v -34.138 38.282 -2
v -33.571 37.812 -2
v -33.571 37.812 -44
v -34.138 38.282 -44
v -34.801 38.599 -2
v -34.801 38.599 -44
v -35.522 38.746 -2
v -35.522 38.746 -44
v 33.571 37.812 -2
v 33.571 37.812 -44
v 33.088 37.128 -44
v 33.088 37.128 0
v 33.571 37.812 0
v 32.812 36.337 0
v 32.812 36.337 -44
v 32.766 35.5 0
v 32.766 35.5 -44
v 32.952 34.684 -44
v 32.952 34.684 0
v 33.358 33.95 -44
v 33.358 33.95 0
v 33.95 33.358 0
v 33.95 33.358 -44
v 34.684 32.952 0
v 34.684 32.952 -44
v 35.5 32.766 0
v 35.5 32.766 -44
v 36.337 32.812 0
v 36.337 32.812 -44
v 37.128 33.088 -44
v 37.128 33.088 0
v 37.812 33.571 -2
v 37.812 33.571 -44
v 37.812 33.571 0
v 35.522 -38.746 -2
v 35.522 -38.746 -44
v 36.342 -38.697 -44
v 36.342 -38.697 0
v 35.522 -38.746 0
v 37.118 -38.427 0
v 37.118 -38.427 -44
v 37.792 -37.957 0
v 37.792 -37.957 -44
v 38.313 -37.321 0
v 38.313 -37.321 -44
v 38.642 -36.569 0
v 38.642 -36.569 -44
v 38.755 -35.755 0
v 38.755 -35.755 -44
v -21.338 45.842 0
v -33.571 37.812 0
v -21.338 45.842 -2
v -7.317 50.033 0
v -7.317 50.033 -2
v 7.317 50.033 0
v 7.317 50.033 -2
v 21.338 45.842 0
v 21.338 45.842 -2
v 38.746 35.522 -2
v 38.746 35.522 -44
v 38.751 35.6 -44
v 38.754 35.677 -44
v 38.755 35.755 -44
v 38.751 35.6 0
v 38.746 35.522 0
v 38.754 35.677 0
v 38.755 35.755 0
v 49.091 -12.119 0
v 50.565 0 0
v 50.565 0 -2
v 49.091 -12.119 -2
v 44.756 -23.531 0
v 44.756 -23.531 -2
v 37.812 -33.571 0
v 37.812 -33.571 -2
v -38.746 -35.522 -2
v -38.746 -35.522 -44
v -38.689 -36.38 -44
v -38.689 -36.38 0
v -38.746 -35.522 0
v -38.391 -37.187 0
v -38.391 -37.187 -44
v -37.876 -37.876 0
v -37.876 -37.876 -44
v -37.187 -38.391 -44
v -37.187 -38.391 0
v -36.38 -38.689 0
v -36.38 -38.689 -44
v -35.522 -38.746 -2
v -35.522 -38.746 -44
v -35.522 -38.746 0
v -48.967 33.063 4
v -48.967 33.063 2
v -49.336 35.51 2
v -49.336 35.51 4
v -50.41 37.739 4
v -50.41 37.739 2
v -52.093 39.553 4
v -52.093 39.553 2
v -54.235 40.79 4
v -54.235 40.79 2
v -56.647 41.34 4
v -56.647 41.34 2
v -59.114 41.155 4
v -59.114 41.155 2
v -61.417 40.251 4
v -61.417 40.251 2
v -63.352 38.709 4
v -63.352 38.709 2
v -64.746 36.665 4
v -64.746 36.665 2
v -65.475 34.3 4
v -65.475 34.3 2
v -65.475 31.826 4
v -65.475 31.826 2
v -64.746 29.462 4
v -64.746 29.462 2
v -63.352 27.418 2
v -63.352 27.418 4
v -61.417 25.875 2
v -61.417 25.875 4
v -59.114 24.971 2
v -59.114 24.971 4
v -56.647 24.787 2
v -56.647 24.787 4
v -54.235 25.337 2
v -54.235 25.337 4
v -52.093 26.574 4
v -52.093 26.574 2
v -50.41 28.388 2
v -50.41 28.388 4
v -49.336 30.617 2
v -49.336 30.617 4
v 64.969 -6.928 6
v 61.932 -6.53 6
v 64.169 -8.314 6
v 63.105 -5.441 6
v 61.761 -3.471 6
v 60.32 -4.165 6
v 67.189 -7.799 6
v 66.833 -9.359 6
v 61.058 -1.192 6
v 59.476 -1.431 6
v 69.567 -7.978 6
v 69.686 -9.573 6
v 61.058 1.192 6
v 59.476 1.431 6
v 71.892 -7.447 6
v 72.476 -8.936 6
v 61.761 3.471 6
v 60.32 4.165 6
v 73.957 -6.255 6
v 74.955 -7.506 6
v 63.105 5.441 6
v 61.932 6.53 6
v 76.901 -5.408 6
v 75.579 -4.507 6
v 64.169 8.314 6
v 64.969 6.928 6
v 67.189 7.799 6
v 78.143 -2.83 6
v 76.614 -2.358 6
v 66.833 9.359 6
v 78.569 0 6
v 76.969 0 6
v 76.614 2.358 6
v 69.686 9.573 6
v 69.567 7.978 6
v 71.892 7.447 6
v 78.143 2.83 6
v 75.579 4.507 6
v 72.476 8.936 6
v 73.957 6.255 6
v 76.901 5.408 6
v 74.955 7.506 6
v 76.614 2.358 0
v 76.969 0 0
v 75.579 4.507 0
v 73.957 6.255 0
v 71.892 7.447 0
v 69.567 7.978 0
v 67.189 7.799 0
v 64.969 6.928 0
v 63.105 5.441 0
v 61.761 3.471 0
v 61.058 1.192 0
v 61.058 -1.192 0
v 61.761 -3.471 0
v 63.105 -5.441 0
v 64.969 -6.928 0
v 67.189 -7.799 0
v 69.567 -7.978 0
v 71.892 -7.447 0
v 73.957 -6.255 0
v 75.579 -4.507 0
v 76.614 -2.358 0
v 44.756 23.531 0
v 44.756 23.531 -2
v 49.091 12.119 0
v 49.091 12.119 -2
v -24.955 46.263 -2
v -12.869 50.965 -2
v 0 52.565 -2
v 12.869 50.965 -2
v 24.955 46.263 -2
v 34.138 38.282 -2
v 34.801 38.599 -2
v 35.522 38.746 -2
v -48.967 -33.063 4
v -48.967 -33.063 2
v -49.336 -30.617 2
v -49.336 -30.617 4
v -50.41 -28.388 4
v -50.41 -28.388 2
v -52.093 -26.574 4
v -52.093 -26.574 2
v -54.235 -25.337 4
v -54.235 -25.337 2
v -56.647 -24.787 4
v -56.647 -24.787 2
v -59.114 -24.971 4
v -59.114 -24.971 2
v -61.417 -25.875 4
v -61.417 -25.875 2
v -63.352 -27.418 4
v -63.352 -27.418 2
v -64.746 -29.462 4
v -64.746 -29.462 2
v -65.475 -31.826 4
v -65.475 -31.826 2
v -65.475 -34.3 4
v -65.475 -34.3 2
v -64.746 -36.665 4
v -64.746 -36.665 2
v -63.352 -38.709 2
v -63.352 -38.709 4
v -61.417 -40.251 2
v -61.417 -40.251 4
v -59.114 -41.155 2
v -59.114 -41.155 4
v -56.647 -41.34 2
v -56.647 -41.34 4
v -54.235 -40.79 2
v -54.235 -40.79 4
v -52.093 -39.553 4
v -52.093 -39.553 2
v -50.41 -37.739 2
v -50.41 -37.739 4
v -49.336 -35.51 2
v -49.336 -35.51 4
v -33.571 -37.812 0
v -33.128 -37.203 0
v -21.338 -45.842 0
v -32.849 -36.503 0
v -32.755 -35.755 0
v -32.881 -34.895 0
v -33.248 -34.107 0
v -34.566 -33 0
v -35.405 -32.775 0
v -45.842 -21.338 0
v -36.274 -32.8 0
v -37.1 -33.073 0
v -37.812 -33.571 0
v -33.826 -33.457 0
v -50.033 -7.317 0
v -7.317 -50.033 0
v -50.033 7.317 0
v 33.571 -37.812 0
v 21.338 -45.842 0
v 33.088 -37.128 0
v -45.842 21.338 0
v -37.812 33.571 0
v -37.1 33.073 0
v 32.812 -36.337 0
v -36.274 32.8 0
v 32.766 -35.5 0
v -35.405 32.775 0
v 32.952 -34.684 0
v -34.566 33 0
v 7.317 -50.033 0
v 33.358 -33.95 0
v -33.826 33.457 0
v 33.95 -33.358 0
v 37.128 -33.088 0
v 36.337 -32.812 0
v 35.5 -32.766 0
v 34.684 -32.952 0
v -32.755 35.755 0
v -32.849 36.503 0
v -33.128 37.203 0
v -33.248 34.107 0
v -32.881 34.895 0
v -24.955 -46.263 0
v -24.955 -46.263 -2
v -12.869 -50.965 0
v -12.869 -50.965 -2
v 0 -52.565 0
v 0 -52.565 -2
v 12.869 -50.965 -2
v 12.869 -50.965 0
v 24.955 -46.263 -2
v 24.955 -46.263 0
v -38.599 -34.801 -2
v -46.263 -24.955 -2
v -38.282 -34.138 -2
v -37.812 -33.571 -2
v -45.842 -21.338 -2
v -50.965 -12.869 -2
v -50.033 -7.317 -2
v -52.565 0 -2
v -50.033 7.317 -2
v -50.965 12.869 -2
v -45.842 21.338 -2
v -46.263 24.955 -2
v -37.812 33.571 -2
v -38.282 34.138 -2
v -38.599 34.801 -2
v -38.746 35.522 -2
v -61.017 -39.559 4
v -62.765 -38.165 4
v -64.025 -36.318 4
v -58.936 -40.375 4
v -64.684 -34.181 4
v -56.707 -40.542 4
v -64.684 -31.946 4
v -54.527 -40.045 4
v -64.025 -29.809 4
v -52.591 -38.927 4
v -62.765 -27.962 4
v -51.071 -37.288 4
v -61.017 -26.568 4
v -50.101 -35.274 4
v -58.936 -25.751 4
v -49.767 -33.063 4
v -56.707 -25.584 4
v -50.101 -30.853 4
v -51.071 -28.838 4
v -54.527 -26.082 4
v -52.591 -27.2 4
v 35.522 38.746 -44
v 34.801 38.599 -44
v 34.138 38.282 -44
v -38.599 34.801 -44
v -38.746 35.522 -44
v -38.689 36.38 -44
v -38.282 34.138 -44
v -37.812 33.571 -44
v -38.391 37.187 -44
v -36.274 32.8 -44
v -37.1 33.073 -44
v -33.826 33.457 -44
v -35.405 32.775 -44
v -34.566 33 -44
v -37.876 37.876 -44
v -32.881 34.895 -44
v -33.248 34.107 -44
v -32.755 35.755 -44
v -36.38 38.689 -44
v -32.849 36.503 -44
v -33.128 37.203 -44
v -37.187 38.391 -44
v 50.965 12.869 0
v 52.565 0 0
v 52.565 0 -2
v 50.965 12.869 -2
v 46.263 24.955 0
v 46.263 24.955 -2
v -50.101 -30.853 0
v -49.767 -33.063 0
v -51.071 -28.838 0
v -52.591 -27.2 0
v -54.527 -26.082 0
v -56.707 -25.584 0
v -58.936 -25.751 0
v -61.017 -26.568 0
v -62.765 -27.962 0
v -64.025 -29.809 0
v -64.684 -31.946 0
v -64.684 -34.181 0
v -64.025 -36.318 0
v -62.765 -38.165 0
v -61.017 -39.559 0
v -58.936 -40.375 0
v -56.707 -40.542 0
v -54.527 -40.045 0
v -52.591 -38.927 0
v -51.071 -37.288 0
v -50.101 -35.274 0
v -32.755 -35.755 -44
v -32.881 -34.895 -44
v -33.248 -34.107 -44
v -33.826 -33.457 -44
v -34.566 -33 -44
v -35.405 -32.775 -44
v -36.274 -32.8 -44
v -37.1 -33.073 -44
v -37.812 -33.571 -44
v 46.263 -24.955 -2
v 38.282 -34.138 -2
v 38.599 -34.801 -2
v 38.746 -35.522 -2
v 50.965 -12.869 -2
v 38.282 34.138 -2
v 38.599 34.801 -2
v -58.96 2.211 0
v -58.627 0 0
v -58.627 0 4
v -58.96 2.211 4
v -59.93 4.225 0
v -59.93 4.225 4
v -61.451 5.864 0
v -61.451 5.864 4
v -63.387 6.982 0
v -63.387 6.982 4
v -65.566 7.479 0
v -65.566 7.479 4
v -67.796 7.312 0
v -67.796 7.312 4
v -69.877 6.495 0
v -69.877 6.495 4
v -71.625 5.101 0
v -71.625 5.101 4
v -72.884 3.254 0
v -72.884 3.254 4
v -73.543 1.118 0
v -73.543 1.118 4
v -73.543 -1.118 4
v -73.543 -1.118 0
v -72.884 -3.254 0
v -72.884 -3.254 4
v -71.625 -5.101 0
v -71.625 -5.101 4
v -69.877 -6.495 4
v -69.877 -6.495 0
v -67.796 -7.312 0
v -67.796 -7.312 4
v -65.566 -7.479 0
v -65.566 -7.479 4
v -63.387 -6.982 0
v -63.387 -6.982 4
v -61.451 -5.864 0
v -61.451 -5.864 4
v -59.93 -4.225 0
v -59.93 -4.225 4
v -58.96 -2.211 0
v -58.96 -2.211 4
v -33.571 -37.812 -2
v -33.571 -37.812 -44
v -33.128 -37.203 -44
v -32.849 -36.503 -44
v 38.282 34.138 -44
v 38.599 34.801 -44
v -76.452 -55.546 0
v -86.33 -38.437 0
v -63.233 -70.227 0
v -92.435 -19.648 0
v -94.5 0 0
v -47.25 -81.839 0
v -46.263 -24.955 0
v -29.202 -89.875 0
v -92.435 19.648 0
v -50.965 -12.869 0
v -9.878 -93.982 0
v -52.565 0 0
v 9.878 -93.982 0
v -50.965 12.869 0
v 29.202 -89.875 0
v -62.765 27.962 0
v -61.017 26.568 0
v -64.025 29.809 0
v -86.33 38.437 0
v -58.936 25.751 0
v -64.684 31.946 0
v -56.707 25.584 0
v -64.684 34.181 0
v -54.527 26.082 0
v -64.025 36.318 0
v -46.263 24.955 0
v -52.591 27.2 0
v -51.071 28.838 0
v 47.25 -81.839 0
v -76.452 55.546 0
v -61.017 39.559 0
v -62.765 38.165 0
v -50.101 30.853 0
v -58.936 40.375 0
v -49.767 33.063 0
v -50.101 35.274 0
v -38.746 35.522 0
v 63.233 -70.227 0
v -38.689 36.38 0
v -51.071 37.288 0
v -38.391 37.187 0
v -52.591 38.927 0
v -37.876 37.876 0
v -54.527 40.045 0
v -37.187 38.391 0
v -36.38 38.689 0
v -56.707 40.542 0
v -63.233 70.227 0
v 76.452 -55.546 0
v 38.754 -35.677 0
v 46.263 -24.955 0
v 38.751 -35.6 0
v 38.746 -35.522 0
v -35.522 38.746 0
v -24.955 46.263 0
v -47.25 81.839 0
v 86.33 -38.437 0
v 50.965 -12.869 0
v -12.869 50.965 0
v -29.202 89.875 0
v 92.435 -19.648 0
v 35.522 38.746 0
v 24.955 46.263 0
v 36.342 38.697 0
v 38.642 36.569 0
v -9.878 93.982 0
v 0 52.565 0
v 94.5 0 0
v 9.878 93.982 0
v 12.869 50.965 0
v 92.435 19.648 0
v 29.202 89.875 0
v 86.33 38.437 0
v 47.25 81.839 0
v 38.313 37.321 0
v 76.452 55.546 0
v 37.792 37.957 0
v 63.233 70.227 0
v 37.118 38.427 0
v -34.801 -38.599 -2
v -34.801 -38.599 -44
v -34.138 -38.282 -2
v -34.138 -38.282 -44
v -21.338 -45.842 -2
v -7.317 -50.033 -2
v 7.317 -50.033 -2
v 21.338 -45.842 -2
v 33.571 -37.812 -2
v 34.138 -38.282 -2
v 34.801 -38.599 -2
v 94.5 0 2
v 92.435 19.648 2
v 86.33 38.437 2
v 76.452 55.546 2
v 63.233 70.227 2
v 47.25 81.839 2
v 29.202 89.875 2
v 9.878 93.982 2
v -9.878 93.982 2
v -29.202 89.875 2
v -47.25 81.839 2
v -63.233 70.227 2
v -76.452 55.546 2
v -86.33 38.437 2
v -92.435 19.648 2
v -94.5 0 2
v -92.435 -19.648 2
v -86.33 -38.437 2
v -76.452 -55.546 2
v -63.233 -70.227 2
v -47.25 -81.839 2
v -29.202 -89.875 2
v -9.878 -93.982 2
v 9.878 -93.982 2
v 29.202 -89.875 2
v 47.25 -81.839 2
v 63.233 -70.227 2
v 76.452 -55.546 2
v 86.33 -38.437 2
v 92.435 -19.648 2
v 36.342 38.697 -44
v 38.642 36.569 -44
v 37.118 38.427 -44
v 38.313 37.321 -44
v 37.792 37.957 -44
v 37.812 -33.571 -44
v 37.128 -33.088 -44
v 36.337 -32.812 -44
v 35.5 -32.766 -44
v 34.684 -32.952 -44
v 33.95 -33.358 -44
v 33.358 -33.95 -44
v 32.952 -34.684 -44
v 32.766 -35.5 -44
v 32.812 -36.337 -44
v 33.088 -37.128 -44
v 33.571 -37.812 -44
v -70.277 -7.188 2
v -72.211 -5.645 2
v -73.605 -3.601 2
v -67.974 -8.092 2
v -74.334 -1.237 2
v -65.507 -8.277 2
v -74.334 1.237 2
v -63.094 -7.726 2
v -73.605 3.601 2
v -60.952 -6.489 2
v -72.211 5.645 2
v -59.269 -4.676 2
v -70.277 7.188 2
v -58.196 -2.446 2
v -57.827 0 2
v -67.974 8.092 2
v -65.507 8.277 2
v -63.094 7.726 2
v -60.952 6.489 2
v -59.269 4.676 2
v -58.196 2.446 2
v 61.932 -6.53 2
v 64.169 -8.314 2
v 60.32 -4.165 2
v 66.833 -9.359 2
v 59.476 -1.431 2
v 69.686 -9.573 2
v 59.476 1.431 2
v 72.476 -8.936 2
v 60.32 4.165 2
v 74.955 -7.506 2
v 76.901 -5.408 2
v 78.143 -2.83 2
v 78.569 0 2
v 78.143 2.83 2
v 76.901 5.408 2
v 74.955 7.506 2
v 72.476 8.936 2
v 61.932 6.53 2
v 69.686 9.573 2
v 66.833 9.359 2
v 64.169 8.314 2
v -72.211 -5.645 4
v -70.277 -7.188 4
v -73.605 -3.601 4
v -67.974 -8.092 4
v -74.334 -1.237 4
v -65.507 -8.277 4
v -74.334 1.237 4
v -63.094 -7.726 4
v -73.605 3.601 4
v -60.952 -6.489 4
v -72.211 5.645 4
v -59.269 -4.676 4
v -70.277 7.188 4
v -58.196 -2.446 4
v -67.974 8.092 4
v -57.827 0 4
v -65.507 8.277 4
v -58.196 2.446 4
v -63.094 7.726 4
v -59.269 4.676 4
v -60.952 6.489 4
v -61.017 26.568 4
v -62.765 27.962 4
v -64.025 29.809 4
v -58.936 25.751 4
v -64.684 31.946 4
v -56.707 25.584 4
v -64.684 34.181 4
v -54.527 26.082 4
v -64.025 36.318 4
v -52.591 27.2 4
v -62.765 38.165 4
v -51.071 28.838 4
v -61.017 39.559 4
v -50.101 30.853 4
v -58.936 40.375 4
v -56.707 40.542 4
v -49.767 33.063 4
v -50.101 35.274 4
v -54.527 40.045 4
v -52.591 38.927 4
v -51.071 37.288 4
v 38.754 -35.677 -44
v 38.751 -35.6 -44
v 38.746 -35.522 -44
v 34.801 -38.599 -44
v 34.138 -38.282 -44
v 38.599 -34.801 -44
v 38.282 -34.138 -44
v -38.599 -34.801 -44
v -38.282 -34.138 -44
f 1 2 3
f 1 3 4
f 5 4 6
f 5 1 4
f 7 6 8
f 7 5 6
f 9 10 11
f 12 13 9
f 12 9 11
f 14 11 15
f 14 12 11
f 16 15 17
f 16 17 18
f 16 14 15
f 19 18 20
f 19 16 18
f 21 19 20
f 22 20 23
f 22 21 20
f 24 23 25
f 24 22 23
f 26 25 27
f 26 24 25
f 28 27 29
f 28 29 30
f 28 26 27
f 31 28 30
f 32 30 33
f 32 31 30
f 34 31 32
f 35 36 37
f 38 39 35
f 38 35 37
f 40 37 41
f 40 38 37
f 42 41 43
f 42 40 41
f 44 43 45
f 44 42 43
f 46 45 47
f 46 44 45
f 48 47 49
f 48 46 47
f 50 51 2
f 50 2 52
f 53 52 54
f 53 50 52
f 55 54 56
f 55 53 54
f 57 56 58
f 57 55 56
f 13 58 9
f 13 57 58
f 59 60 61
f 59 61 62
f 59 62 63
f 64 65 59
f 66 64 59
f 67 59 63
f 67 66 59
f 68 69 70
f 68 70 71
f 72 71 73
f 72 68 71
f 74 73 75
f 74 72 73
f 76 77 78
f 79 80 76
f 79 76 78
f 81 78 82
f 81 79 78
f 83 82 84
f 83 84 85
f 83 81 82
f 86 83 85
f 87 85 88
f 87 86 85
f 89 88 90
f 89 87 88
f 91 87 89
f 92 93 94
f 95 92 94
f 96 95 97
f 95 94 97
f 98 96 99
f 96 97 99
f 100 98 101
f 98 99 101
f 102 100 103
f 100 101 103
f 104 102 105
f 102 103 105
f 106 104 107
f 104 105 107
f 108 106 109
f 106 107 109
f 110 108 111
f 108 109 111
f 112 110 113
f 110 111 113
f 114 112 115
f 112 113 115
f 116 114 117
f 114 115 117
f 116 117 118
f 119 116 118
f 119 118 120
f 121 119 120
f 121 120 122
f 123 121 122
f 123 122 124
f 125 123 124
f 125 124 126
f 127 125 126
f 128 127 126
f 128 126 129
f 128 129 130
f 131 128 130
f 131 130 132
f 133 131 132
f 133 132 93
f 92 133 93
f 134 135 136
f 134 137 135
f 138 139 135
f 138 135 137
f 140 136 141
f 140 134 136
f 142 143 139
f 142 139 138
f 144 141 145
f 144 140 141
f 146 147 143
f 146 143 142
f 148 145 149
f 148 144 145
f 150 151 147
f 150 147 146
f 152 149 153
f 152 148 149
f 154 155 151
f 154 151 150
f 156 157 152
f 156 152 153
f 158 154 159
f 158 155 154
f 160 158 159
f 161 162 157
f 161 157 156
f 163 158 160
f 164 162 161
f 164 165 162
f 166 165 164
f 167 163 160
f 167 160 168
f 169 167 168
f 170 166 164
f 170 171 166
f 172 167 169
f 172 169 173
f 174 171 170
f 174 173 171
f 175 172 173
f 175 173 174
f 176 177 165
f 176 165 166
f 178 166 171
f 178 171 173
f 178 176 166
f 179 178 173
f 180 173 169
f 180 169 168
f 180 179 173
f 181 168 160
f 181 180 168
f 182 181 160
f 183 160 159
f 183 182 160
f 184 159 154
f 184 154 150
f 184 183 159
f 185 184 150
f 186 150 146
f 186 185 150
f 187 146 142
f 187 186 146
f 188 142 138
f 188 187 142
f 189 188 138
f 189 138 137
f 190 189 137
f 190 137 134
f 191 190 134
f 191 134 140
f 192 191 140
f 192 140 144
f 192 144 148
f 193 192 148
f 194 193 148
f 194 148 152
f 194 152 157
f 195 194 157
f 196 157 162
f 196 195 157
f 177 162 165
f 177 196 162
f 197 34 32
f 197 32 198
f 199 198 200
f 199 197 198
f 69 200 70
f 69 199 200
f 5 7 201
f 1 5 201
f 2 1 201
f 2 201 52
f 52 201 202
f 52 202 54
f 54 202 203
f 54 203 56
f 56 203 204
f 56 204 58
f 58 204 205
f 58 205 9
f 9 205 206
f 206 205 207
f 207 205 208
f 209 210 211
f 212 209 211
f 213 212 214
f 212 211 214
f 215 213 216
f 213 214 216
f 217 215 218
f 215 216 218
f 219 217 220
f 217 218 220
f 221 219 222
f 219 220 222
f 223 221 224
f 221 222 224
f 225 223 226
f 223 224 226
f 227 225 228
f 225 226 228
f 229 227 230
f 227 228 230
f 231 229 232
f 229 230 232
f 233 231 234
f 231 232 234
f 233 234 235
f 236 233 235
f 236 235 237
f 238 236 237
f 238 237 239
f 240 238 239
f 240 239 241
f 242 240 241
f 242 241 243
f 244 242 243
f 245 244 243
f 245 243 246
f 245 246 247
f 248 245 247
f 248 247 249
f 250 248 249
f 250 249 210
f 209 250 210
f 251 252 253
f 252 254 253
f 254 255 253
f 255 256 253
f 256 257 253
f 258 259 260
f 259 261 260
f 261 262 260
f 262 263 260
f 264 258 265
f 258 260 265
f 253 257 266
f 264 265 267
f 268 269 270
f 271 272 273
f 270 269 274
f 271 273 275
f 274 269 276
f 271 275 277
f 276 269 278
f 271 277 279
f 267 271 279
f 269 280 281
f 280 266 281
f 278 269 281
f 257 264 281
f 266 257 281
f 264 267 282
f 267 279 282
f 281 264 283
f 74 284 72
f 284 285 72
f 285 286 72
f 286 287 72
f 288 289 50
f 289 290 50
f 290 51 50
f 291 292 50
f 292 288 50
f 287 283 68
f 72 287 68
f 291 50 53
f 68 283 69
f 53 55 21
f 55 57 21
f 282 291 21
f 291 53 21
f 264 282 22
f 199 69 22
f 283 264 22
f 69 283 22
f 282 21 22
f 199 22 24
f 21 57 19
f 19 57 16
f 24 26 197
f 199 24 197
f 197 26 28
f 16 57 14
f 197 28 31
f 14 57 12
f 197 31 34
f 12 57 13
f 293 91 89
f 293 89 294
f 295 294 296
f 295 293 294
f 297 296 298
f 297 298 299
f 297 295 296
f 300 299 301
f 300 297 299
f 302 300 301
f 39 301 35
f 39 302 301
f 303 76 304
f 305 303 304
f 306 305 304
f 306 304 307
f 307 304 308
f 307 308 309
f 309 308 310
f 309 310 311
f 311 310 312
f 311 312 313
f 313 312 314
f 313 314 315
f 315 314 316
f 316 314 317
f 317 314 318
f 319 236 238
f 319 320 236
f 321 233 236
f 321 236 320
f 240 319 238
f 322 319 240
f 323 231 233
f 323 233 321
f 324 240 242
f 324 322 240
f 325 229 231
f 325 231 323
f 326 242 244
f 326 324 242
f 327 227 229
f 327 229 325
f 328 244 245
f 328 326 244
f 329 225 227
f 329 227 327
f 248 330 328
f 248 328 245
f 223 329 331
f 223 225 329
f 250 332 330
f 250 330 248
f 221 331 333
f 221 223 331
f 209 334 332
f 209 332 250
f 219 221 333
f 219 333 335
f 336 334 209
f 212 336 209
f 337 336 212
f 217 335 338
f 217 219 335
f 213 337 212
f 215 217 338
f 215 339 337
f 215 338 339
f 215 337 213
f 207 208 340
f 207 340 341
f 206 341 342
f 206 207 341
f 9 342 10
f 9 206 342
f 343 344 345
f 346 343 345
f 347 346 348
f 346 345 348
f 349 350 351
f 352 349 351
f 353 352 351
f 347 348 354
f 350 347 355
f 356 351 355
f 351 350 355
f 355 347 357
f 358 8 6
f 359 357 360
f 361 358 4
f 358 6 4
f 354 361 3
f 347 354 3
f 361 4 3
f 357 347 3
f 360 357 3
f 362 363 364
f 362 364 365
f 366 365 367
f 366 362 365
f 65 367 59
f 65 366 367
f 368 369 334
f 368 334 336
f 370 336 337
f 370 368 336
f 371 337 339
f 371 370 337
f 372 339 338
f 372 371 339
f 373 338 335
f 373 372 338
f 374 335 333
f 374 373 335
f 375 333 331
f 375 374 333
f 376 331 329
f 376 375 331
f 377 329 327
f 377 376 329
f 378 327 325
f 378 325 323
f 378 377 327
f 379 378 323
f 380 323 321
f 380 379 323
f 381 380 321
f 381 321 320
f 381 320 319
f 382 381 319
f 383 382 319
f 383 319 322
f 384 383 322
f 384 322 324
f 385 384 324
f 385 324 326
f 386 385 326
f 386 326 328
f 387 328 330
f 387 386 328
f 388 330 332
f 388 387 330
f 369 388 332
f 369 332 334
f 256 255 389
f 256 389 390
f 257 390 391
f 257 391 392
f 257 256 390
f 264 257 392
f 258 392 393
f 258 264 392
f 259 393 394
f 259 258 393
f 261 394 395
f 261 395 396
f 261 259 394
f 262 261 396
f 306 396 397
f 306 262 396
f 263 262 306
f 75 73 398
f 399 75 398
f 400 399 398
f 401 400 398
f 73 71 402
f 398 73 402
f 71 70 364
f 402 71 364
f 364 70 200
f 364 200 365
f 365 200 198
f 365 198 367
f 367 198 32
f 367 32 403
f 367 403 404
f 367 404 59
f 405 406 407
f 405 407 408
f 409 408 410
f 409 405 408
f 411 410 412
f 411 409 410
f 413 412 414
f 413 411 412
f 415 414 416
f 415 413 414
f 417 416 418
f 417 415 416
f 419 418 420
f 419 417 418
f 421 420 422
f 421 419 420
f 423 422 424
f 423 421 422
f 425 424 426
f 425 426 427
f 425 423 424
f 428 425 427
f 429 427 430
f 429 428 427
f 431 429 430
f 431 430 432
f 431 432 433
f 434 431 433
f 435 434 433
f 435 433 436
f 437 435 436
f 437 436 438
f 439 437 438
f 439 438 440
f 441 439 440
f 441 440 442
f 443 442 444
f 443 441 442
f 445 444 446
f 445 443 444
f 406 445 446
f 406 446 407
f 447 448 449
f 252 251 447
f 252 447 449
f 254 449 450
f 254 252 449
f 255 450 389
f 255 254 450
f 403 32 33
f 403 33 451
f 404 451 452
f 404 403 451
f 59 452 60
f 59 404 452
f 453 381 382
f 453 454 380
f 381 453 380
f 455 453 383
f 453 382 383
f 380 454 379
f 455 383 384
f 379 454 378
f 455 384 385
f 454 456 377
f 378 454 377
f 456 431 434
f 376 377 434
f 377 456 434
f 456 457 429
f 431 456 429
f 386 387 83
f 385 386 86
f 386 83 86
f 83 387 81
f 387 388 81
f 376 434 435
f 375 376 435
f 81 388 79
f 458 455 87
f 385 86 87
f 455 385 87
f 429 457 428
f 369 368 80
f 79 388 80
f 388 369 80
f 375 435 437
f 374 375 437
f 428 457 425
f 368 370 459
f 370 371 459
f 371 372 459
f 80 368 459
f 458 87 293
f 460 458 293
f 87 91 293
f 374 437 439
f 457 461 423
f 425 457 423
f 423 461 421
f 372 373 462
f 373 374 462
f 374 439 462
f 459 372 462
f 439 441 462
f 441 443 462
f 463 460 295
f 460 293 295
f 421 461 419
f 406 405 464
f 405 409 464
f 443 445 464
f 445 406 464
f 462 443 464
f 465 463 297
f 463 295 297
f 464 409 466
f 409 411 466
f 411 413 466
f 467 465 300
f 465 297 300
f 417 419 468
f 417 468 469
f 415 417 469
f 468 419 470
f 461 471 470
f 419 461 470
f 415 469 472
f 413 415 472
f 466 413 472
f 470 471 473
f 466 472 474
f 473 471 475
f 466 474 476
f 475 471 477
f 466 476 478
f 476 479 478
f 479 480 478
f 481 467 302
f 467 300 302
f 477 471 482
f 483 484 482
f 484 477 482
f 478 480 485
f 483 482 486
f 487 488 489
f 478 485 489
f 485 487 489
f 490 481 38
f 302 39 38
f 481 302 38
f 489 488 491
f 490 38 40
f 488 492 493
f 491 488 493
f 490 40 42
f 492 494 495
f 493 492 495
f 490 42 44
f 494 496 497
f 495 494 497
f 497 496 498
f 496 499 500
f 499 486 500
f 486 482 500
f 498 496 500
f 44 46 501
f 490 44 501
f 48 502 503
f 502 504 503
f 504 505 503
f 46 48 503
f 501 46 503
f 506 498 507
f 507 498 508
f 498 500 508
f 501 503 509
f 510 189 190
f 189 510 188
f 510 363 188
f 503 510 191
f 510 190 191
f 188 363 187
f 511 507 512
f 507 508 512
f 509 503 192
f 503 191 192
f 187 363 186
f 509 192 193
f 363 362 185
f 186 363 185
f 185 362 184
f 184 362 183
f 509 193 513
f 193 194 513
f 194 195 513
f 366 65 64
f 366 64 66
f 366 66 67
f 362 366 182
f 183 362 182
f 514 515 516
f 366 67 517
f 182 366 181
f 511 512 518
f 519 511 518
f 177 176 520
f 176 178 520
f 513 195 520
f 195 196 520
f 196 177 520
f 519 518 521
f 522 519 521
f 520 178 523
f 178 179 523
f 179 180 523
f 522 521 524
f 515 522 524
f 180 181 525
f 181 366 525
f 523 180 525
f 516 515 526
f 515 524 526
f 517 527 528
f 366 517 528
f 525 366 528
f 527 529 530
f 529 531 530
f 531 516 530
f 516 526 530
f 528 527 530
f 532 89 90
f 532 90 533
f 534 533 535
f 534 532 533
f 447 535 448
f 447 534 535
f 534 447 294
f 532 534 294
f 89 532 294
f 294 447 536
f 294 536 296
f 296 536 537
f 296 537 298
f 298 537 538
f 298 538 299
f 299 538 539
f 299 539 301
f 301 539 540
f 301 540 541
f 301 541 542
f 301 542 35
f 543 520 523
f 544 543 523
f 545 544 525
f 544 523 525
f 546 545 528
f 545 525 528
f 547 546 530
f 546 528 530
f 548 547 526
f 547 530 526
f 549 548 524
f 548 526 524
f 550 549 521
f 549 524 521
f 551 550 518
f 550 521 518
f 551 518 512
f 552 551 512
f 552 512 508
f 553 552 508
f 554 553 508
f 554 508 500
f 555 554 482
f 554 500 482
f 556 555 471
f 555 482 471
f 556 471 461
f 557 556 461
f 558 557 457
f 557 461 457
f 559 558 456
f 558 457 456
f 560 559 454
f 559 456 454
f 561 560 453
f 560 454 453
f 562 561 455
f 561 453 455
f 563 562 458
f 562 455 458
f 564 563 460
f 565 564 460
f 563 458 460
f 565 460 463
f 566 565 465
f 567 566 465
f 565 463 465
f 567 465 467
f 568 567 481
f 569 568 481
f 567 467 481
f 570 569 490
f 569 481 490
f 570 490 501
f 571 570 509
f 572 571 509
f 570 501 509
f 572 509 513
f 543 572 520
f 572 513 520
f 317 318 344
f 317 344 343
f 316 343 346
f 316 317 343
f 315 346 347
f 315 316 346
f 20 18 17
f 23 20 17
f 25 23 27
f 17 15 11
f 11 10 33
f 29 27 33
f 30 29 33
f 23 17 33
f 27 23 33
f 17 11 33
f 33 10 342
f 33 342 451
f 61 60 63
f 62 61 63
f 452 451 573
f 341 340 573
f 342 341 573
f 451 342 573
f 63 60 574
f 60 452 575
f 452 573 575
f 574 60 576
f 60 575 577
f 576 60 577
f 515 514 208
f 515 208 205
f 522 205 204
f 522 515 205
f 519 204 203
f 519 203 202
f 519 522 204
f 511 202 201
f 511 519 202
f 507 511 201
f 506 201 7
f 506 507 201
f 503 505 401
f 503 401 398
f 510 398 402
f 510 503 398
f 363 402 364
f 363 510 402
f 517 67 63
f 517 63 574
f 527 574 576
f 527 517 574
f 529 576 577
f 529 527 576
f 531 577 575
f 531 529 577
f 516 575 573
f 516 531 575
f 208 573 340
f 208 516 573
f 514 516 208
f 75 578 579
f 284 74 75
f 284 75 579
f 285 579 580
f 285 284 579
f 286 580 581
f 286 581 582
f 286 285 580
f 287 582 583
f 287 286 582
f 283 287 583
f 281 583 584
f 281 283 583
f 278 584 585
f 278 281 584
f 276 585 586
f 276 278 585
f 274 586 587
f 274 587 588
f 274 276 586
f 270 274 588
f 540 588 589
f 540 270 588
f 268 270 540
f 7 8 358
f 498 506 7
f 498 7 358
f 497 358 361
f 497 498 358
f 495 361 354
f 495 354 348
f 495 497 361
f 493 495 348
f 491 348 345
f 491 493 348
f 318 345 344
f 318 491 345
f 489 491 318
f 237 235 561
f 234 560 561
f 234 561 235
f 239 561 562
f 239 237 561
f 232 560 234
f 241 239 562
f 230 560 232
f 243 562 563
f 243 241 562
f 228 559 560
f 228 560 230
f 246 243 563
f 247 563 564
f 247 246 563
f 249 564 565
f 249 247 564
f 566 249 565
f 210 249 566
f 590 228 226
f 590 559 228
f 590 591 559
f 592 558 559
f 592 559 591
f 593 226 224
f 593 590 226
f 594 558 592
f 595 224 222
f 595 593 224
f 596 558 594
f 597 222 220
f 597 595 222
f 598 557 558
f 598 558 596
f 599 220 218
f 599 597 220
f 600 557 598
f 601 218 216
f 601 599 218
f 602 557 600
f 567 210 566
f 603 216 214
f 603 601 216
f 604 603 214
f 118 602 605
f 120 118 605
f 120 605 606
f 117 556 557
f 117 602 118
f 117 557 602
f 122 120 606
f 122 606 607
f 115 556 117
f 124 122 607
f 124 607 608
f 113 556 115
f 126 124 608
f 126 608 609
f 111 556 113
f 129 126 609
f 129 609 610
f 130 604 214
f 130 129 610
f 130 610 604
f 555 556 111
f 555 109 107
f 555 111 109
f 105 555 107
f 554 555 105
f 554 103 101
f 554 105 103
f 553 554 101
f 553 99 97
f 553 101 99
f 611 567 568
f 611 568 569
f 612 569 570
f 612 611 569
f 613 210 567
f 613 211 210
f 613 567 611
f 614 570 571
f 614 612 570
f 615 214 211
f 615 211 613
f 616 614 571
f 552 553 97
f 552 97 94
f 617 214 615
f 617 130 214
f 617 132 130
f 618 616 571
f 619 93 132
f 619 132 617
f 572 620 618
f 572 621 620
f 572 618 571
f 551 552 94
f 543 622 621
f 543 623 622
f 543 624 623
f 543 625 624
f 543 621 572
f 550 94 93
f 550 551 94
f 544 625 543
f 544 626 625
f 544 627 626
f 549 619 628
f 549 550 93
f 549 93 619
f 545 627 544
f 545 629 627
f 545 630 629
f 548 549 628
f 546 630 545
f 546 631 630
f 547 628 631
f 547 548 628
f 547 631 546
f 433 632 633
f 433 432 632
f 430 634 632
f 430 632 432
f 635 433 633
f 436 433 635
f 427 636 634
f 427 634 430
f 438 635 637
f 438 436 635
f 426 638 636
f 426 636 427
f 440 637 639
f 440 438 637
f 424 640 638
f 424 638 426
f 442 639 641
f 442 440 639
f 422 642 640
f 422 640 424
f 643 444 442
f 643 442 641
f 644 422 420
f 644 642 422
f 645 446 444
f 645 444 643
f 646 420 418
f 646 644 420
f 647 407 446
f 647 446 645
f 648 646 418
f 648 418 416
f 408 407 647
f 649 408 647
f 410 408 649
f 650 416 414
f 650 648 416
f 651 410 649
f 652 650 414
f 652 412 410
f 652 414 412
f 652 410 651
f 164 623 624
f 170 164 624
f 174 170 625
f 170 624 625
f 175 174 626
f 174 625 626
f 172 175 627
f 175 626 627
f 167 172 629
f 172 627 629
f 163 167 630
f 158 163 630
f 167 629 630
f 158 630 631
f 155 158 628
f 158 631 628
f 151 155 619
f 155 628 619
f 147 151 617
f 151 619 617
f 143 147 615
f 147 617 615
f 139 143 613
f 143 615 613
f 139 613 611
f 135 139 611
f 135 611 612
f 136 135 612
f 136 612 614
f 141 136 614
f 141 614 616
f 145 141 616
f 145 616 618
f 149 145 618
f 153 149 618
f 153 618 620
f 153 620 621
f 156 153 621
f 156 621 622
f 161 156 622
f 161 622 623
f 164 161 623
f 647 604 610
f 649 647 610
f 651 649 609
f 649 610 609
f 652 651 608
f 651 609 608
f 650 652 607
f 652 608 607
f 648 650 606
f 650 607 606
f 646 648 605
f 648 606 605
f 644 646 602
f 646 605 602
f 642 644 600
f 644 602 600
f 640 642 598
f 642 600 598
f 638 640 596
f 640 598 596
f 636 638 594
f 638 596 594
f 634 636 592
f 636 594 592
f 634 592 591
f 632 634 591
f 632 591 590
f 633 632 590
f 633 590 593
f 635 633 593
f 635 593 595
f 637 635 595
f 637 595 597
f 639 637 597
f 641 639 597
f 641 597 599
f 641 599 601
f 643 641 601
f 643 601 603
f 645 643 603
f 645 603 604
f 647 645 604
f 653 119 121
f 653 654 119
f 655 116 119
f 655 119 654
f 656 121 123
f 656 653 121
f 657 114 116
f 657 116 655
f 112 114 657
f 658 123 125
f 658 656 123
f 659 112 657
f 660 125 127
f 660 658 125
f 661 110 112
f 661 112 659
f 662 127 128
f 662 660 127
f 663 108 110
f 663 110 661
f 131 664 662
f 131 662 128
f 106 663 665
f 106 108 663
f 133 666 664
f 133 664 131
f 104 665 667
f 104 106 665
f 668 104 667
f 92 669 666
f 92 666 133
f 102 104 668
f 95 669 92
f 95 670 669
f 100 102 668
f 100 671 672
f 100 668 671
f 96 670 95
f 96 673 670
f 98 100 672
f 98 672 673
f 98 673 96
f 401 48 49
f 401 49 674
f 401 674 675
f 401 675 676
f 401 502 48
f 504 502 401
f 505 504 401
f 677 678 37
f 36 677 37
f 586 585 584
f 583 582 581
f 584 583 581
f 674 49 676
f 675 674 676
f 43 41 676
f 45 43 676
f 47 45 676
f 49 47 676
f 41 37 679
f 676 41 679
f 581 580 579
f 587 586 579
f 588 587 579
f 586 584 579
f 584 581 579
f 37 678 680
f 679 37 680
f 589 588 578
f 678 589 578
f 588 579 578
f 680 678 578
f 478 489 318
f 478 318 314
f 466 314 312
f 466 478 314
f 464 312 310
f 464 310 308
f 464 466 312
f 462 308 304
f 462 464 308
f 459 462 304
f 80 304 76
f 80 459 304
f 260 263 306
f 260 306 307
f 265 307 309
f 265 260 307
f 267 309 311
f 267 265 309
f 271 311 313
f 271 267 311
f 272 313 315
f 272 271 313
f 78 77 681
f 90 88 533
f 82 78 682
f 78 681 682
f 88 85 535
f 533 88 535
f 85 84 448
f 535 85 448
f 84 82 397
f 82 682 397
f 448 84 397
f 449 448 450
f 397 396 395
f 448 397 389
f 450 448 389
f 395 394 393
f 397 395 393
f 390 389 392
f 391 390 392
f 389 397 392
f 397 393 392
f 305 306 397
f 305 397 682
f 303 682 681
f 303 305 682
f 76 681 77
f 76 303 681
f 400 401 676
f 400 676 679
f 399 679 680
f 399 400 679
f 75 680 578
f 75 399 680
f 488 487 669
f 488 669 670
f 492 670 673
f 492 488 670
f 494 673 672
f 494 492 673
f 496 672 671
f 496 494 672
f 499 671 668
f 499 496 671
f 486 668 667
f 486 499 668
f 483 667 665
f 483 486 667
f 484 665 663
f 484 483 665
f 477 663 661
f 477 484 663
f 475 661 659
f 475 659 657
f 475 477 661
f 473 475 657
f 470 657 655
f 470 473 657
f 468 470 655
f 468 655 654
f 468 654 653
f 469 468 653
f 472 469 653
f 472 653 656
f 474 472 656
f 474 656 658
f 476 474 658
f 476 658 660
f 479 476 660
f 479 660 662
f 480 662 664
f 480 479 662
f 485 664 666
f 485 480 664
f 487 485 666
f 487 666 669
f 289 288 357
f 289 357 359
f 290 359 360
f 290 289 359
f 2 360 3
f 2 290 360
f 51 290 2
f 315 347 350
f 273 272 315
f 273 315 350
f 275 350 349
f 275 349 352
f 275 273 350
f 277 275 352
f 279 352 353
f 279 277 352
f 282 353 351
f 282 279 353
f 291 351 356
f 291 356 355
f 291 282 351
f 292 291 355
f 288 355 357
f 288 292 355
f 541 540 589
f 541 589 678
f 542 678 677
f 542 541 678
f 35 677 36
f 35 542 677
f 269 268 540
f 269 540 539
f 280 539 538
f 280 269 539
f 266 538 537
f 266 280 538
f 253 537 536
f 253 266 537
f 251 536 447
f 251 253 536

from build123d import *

# Parameters (mm, degrees)
F0_R     = 94.5
F0_R_2   = 8.3
F0_R_3   = 9.6
F1_DEPTH = 2
F0_R_4   = 7.5
F2_DEPTH = 4
F3_DEPTH = 2
F0_R_5   = 8
F4_DEPTH = 6
F5_DEPTH = 44


# Not quite as in the source:
# - a feature names something its author has since deleted; it is built from what else it names


with BuildPart() as f1:
    # F0 (on Top) → F1 (new body)
    with BuildSketch(Plane.XY):
        Circle(F0_R)
        with Locations((-57.2674702435, -33.0633893609)):
            Circle(F0_R_2, mode=Mode.SUBTRACT)
        with Locations((-66.1267787218, 0)):
            Circle(F0_R_2, mode=Mode.SUBTRACT)
        with Locations((-57.2674702435, 33.0633893609)):
            Circle(F0_R_2, mode=Mode.SUBTRACT)
        with BuildLine():
            ThreePointArc((38.7457430555, 35.5222910868), (48.9884210475, 19.0578165656), (52.5648720057, 0))
            ThreePointArc((52.5648720057, 0), (48.9884210475, -19.0578165656), (38.7457430555, -35.5222910868))
            ThreePointArc((38.7457430555, -35.5222910868), (38.7525078294, -35.6384400082), (38.7547638851, -35.7547638851))
            ThreePointArc((38.7547638851, -35.7547638851), (37.7922355542, -37.9567423585), (35.5222910868, -38.7457430555))
            ThreePointArc((35.5222910868, -38.7457430555), (0, -52.5648720057), (-35.5222910868, -38.7457430555))
            ThreePointArc((-35.5222910868, -38.7457430555), (-37.8760842286, -37.8760842286), (-38.7457430555, -35.5222910868))
            ThreePointArc((-38.7457430555, -35.5222910868), (-52.5648720057, 0), (-38.7457430555, 35.5222910868))
            ThreePointArc((-38.7457430555, 35.5222910868), (-37.8760842286, 37.8760842286), (-35.5222910868, 38.7457430555))
            ThreePointArc((-35.5222910868, 38.7457430555), (0, 52.5648720057), (35.5222910868, 38.7457430555))
            ThreePointArc((35.5222910868, 38.7457430555), (37.7922355542, 37.9567423585), (38.7547638851, 35.7547638851))
            ThreePointArc((38.7547638851, 35.7547638851), (38.7525078294, 35.6384400082), (38.7457430555, 35.5222910868))
        make_face(mode=Mode.SUBTRACT)
        with Locations((68.9690709114, 0)):
            Circle(F0_R_3, mode=Mode.SUBTRACT)
        with BuildLine():
            ThreePointArc((33.5714484549, 37.8122219605), (33.6334435415, 33.6334435415), (37.8122219605, 33.5714484549))
            ThreePointArc((37.8122219605, 33.5714484549), (35.7547638851, 35.7547638851), (33.5714484549, 37.8122219605))
        make_face()
        with BuildLine():
            ThreePointArc((-37.8122219605, 33.5714484549), (-38.4608914504, 34.459822342), (-38.7457430555, 35.5222910868))
            ThreePointArc((-38.7457430555, 35.5222910868), (-52.5648720057, 0), (-38.7457430555, -35.5222910868))
            ThreePointArc((-38.7457430555, -35.5222910868), (-38.4608914504, -34.459822342), (-37.8122219605, -33.5714484549))
            ThreePointArc((-37.8122219605, -33.5714484549), (-50.5648720057, 0), (-37.8122219605, 33.5714484549))
        make_face()
        with BuildLine():
            ThreePointArc((-35.5222910868, -38.7457430555), (0, -52.5648720057), (35.5222910868, -38.7457430555))
            ThreePointArc((35.5222910868, -38.7457430555), (34.459822342, -38.4608914504), (33.5714484549, -37.8122219605))
            ThreePointArc((33.5714484549, -37.8122219605), (0, -50.5648720057), (-33.5714484549, -37.8122219605))
            ThreePointArc((-33.5714484549, -37.8122219605), (-34.459822342, -38.4608914504), (-35.5222910868, -38.7457430555))
        make_face()
        with BuildLine():
            ThreePointArc((38.7457430555, -35.5222910868), (48.9884210475, -19.0578165656), (52.5648720057, 0))
            ThreePointArc((52.5648720057, 0), (48.9884210475, 19.0578165656), (38.7457430555, 35.5222910868))
            ThreePointArc((38.7457430555, 35.5222910868), (38.4608914504, 34.459822342), (37.8122219605, 33.5714484549))
            ThreePointArc((37.8122219605, 33.5714484549), (47.2693158647, 17.9560034148), (50.5648720057, 0))
            ThreePointArc((50.5648720057, 0), (47.2693158647, -17.9560034148), (37.8122219605, -33.5714484549))
            ThreePointArc((37.8122219605, -33.5714484549), (38.4608914504, -34.459822342), (38.7457430555, -35.5222910868))
        make_face()
        with BuildLine():
            ThreePointArc((33.5714484549, 37.8122219605), (34.459822342, 38.4608914504), (35.5222910868, 38.7457430555))
            ThreePointArc((35.5222910868, 38.7457430555), (0, 52.5648720057), (-35.5222910868, 38.7457430555))
            ThreePointArc((-35.5222910868, 38.7457430555), (-34.459822342, 38.4608914504), (-33.5714484549, 37.8122219605))
            ThreePointArc((-33.5714484549, 37.8122219605), (0, 50.5648720057), (33.5714484549, 37.8122219605))
        make_face()
        with BuildLine():
            ThreePointArc((33.5714484549, -37.8122219605), (35.7547638851, -35.7547638851), (37.8122219605, -33.5714484549))
            ThreePointArc((37.8122219605, -33.5714484549), (33.6334435415, -33.6334435415), (33.5714484549, -37.8122219605))
        make_face()
        with BuildLine():
            ThreePointArc((35.5222910868, -38.7457430555), (37.1689774474, -37.1689774474), (38.7457430555, -35.5222910868))
            ThreePointArc((38.7457430555, -35.5222910868), (38.4608914504, -34.459822342), (37.8122219605, -33.5714484549))
            ThreePointArc((37.8122219605, -33.5714484549), (35.7547638851, -35.7547638851), (33.5714484549, -37.8122219605))
            ThreePointArc((33.5714484549, -37.8122219605), (34.459822342, -38.4608914504), (35.5222910868, -38.7457430555))
        make_face()
        with BuildLine():
            ThreePointArc((38.7547638851, -35.7547638851), (38.7525078294, -35.6384400082), (38.7457430555, -35.5222910868))
            ThreePointArc((38.7457430555, -35.5222910868), (37.1689774474, -37.1689774474), (35.5222910868, -38.7457430555))
            ThreePointArc((35.5222910868, -38.7457430555), (37.7922355542, -37.9567423585), (38.7547638851, -35.7547638851))
        make_face()
        with BuildLine():
            ThreePointArc((50.5648720057, 0), (47.2693158647, 17.9560034148), (37.8122219605, 33.5714484549))
            ThreePointArc((37.8122219605, 33.5714484549), (33.6334435415, 33.6334435415), (33.5714484549, 37.8122219605))
            ThreePointArc((33.5714484549, 37.8122219605), (0, 50.5648720057), (-33.5714484549, 37.8122219605))
            ThreePointArc((-33.5714484549, 37.8122219605), (-32.9664000018, 36.8615731978), (-32.7547638851, 35.7547638851))
            ThreePointArc((-32.7547638851, 35.7547638851), (-34.5657252453, 33.0004605043), (-37.8122219605, 33.5714484549))
            ThreePointArc((-37.8122219605, 33.5714484549), (-50.5648720057, 0), (-37.8122219605, -33.5714484549))
            ThreePointArc((-37.8122219605, -33.5714484549), (-34.5657252453, -33.0004605043), (-32.7547638851, -35.7547638851))
            ThreePointArc((-32.7547638851, -35.7547638851), (-32.9664000018, -36.8615731978), (-33.5714484549, -37.8122219605))
            ThreePointArc((-33.5714484549, -37.8122219605), (0, -50.5648720057), (33.5714484549, -37.8122219605))
            ThreePointArc((33.5714484549, -37.8122219605), (33.6334435415, -33.6334435415), (37.8122219605, -33.5714484549))
            ThreePointArc((37.8122219605, -33.5714484549), (47.2693158647, -17.9560034148), (50.5648720057, 0))
        make_face()
        with BuildLine():
            ThreePointArc((37.8122219605, 33.5714484549), (38.4608914504, 34.459822342), (38.7457430555, 35.5222910868))
            ThreePointArc((38.7457430555, 35.5222910868), (37.1689774474, 37.1689774474), (35.5222910868, 38.7457430555))
            ThreePointArc((35.5222910868, 38.7457430555), (34.459822342, 38.4608914504), (33.5714484549, 37.8122219605))
            ThreePointArc((33.5714484549, 37.8122219605), (35.7547638851, 35.7547638851), (37.8122219605, 33.5714484549))
        make_face()
        with BuildLine():
            ThreePointArc((35.5222910868, 38.7457430555), (37.1689774474, 37.1689774474), (38.7457430555, 35.5222910868))
            ThreePointArc((38.7457430555, 35.5222910868), (38.7525078294, 35.6384400082), (38.7547638851, 35.7547638851))
            ThreePointArc((38.7547638851, 35.7547638851), (37.7922355542, 37.9567423585), (35.5222910868, 38.7457430555))
        make_face()
        with BuildLine():
            ThreePointArc((-38.7457430555, 35.5222910868), (-37.1689774474, 37.1689774474), (-35.5222910868, 38.7457430555))
            ThreePointArc((-35.5222910868, 38.7457430555), (-37.8760842286, 37.8760842286), (-38.7457430555, 35.5222910868))
        make_face()
        with BuildLine():
            ThreePointArc((-33.5714484549, 37.8122219605), (-34.459822342, 38.4608914504), (-35.5222910868, 38.7457430555))
            ThreePointArc((-35.5222910868, 38.7457430555), (-37.1689774474, 37.1689774474), (-38.7457430555, 35.5222910868))
            ThreePointArc((-38.7457430555, 35.5222910868), (-38.4608914504, 34.459822342), (-37.8122219605, 33.5714484549))
            ThreePointArc((-37.8122219605, 33.5714484549), (-35.7547638851, 35.7547638851), (-33.5714484549, 37.8122219605))
        make_face()
        with BuildLine():
            ThreePointArc((-32.7547638851, 35.7547638851), (-32.9664000018, 36.8615731978), (-33.5714484549, 37.8122219605))
            ThreePointArc((-33.5714484549, 37.8122219605), (-35.7547638851, 35.7547638851), (-37.8122219605, 33.5714484549))
            ThreePointArc((-37.8122219605, 33.5714484549), (-34.5657252453, 33.0004605043), (-32.7547638851, 35.7547638851))
        make_face()
        with BuildLine():
            ThreePointArc((-38.7457430555, -35.5222910868), (-37.8760842286, -37.8760842286), (-35.5222910868, -38.7457430555))
            ThreePointArc((-35.5222910868, -38.7457430555), (-37.1689774474, -37.1689774474), (-38.7457430555, -35.5222910868))
        make_face()
        with BuildLine():
            ThreePointArc((-38.7457430555, -35.5222910868), (-37.1689774474, -37.1689774474), (-35.5222910868, -38.7457430555))
            ThreePointArc((-35.5222910868, -38.7457430555), (-34.459822342, -38.4608914504), (-33.5714484549, -37.8122219605))
            ThreePointArc((-33.5714484549, -37.8122219605), (-35.7547638851, -35.7547638851), (-37.8122219605, -33.5714484549))
            ThreePointArc((-37.8122219605, -33.5714484549), (-38.4608914504, -34.459822342), (-38.7457430555, -35.5222910868))
        make_face()
        with BuildLine():
            ThreePointArc((-37.8122219605, -33.5714484549), (-35.7547638851, -35.7547638851), (-33.5714484549, -37.8122219605))
            ThreePointArc((-33.5714484549, -37.8122219605), (-32.9664000018, -36.8615731978), (-32.7547638851, -35.7547638851))
            ThreePointArc((-32.7547638851, -35.7547638851), (-34.5657252453, -33.0004605043), (-37.8122219605, -33.5714484549))
        make_face()
    extrude(amount=F1_DEPTH)

    # F0 (on Top) → F2 (join)
    with BuildSketch(Plane.XY):
        with Locations((-57.2674702435, 33.0633893609)):
            Circle(F0_R_2)
        with Locations((-57.2674702435, 33.0633893609)):
            Circle(F0_R_4, mode=Mode.SUBTRACT)
        with Locations((-66.1267787218, 0)):
            Circle(F0_R_2)
        with Locations((-66.1267787218, 0)):
            Circle(F0_R_4, mode=Mode.SUBTRACT)
        with Locations((-57.2674702435, -33.0633893609)):
            Circle(F0_R_2)
        with Locations((-57.2674702435, -33.0633893609)):
            Circle(F0_R_4, mode=Mode.SUBTRACT)
    extrude(amount=F2_DEPTH)

    # F0 (on Top) → F3 (join)
    with BuildSketch(Plane.XY):
        with BuildLine():
            ThreePointArc((-37.8122219605, 33.5714484549), (-38.4608914504, 34.459822342), (-38.7457430555, 35.5222910868))
            ThreePointArc((-38.7457430555, 35.5222910868), (-52.5648720057, 0), (-38.7457430555, -35.5222910868))
            ThreePointArc((-38.7457430555, -35.5222910868), (-38.4608914504, -34.459822342), (-37.8122219605, -33.5714484549))
            ThreePointArc((-37.8122219605, -33.5714484549), (-50.5648720057, 0), (-37.8122219605, 33.5714484549))
        make_face()
        with BuildLine():
            ThreePointArc((-35.5222910868, -38.7457430555), (0, -52.5648720057), (35.5222910868, -38.7457430555))
            ThreePointArc((35.5222910868, -38.7457430555), (34.459822342, -38.4608914504), (33.5714484549, -37.8122219605))
            ThreePointArc((33.5714484549, -37.8122219605), (0, -50.5648720057), (-33.5714484549, -37.8122219605))
            ThreePointArc((-33.5714484549, -37.8122219605), (-34.459822342, -38.4608914504), (-35.5222910868, -38.7457430555))
        make_face()
        with BuildLine():
            ThreePointArc((38.7457430555, -35.5222910868), (48.9884210475, -19.0578165656), (52.5648720057, 0))
            ThreePointArc((52.5648720057, 0), (48.9884210475, 19.0578165656), (38.7457430555, 35.5222910868))
            ThreePointArc((38.7457430555, 35.5222910868), (38.4608914504, 34.459822342), (37.8122219605, 33.5714484549))
            ThreePointArc((37.8122219605, 33.5714484549), (47.2693158647, 17.9560034148), (50.5648720057, 0))
            ThreePointArc((50.5648720057, 0), (47.2693158647, -17.9560034148), (37.8122219605, -33.5714484549))
            ThreePointArc((37.8122219605, -33.5714484549), (38.4608914504, -34.459822342), (38.7457430555, -35.5222910868))
        make_face()
        with BuildLine():
            ThreePointArc((33.5714484549, 37.8122219605), (34.459822342, 38.4608914504), (35.5222910868, 38.7457430555))
            ThreePointArc((35.5222910868, 38.7457430555), (0, 52.5648720057), (-35.5222910868, 38.7457430555))
            ThreePointArc((-35.5222910868, 38.7457430555), (-34.459822342, 38.4608914504), (-33.5714484549, 37.8122219605))
            ThreePointArc((-33.5714484549, 37.8122219605), (0, 50.5648720057), (33.5714484549, 37.8122219605))
        make_face()
    extrude(amount=-F3_DEPTH)

    # F0 (on Top) → F4 (join)
    with BuildSketch(Plane.XY):
        with Locations((68.9690709114, 0)):
            Circle(F0_R_3)
        with Locations((68.9690709114, 0)):
            Circle(F0_R_5, mode=Mode.SUBTRACT)
    extrude(amount=F4_DEPTH)

    # F0 (on Top) → F5 (join)
    with BuildSketch(Plane.XY):
        with BuildLine():
            ThreePointArc((37.8122219605, 33.5714484549), (38.4608914504, 34.459822342), (38.7457430555, 35.5222910868))
            ThreePointArc((38.7457430555, 35.5222910868), (37.1689774474, 37.1689774474), (35.5222910868, 38.7457430555))
            ThreePointArc((35.5222910868, 38.7457430555), (34.459822342, 38.4608914504), (33.5714484549, 37.8122219605))
            ThreePointArc((33.5714484549, 37.8122219605), (35.7547638851, 35.7547638851), (37.8122219605, 33.5714484549))
        make_face()
        with BuildLine():
            ThreePointArc((35.5222910868, 38.7457430555), (37.1689774474, 37.1689774474), (38.7457430555, 35.5222910868))
            ThreePointArc((38.7457430555, 35.5222910868), (38.7525078294, 35.6384400082), (38.7547638851, 35.7547638851))
            ThreePointArc((38.7547638851, 35.7547638851), (37.7922355542, 37.9567423585), (35.5222910868, 38.7457430555))
        make_face()
        with BuildLine():
            ThreePointArc((38.7547638851, -35.7547638851), (38.7525078294, -35.6384400082), (38.7457430555, -35.5222910868))
            ThreePointArc((38.7457430555, -35.5222910868), (37.1689774474, -37.1689774474), (35.5222910868, -38.7457430555))
            ThreePointArc((35.5222910868, -38.7457430555), (37.7922355542, -37.9567423585), (38.7547638851, -35.7547638851))
        make_face()
        with BuildLine():
            ThreePointArc((35.5222910868, -38.7457430555), (37.1689774474, -37.1689774474), (38.7457430555, -35.5222910868))
            ThreePointArc((38.7457430555, -35.5222910868), (38.4608914504, -34.459822342), (37.8122219605, -33.5714484549))
            ThreePointArc((37.8122219605, -33.5714484549), (35.7547638851, -35.7547638851), (33.5714484549, -37.8122219605))
            ThreePointArc((33.5714484549, -37.8122219605), (34.459822342, -38.4608914504), (35.5222910868, -38.7457430555))
        make_face()
        with BuildLine():
            ThreePointArc((33.5714484549, 37.8122219605), (33.6334435415, 33.6334435415), (37.8122219605, 33.5714484549))
            ThreePointArc((37.8122219605, 33.5714484549), (35.7547638851, 35.7547638851), (33.5714484549, 37.8122219605))
        make_face()
        with BuildLine():
            ThreePointArc((33.5714484549, -37.8122219605), (35.7547638851, -35.7547638851), (37.8122219605, -33.5714484549))
            ThreePointArc((37.8122219605, -33.5714484549), (33.6334435415, -33.6334435415), (33.5714484549, -37.8122219605))
        make_face()
        with BuildLine():
            ThreePointArc((-33.5714484549, 37.8122219605), (-34.459822342, 38.4608914504), (-35.5222910868, 38.7457430555))
            ThreePointArc((-35.5222910868, 38.7457430555), (-37.1689774474, 37.1689774474), (-38.7457430555, 35.5222910868))
            ThreePointArc((-38.7457430555, 35.5222910868), (-38.4608914504, 34.459822342), (-37.8122219605, 33.5714484549))
            ThreePointArc((-37.8122219605, 33.5714484549), (-35.7547638851, 35.7547638851), (-33.5714484549, 37.8122219605))
        make_face()
        with BuildLine():
            ThreePointArc((-38.7457430555, 35.5222910868), (-37.1689774474, 37.1689774474), (-35.5222910868, 38.7457430555))
            ThreePointArc((-35.5222910868, 38.7457430555), (-37.8760842286, 37.8760842286), (-38.7457430555, 35.5222910868))
        make_face()
        with BuildLine():
            ThreePointArc((-38.7457430555, -35.5222910868), (-37.8760842286, -37.8760842286), (-35.5222910868, -38.7457430555))
            ThreePointArc((-35.5222910868, -38.7457430555), (-37.1689774474, -37.1689774474), (-38.7457430555, -35.5222910868))
        make_face()
        with BuildLine():
            ThreePointArc((-38.7457430555, -35.5222910868), (-37.1689774474, -37.1689774474), (-35.5222910868, -38.7457430555))
            ThreePointArc((-35.5222910868, -38.7457430555), (-34.459822342, -38.4608914504), (-33.5714484549, -37.8122219605))
            ThreePointArc((-33.5714484549, -37.8122219605), (-35.7547638851, -35.7547638851), (-37.8122219605, -33.5714484549))
            ThreePointArc((-37.8122219605, -33.5714484549), (-38.4608914504, -34.459822342), (-38.7457430555, -35.5222910868))
        make_face()
        with BuildLine():
            ThreePointArc((-32.7547638851, 35.7547638851), (-32.9664000018, 36.8615731978), (-33.5714484549, 37.8122219605))
            ThreePointArc((-33.5714484549, 37.8122219605), (-35.7547638851, 35.7547638851), (-37.8122219605, 33.5714484549))
            ThreePointArc((-37.8122219605, 33.5714484549), (-34.5657252453, 33.0004605043), (-32.7547638851, 35.7547638851))
        make_face()
        with BuildLine():
            ThreePointArc((-37.8122219605, -33.5714484549), (-35.7547638851, -35.7547638851), (-33.5714484549, -37.8122219605))
            ThreePointArc((-33.5714484549, -37.8122219605), (-32.9664000018, -36.8615731978), (-32.7547638851, -35.7547638851))
            ThreePointArc((-32.7547638851, -35.7547638851), (-34.5657252453, -33.0004605043), (-37.8122219605, -33.5714484549))
        make_face()
    extrude(amount=-F5_DEPTH)


solid = f1.part
